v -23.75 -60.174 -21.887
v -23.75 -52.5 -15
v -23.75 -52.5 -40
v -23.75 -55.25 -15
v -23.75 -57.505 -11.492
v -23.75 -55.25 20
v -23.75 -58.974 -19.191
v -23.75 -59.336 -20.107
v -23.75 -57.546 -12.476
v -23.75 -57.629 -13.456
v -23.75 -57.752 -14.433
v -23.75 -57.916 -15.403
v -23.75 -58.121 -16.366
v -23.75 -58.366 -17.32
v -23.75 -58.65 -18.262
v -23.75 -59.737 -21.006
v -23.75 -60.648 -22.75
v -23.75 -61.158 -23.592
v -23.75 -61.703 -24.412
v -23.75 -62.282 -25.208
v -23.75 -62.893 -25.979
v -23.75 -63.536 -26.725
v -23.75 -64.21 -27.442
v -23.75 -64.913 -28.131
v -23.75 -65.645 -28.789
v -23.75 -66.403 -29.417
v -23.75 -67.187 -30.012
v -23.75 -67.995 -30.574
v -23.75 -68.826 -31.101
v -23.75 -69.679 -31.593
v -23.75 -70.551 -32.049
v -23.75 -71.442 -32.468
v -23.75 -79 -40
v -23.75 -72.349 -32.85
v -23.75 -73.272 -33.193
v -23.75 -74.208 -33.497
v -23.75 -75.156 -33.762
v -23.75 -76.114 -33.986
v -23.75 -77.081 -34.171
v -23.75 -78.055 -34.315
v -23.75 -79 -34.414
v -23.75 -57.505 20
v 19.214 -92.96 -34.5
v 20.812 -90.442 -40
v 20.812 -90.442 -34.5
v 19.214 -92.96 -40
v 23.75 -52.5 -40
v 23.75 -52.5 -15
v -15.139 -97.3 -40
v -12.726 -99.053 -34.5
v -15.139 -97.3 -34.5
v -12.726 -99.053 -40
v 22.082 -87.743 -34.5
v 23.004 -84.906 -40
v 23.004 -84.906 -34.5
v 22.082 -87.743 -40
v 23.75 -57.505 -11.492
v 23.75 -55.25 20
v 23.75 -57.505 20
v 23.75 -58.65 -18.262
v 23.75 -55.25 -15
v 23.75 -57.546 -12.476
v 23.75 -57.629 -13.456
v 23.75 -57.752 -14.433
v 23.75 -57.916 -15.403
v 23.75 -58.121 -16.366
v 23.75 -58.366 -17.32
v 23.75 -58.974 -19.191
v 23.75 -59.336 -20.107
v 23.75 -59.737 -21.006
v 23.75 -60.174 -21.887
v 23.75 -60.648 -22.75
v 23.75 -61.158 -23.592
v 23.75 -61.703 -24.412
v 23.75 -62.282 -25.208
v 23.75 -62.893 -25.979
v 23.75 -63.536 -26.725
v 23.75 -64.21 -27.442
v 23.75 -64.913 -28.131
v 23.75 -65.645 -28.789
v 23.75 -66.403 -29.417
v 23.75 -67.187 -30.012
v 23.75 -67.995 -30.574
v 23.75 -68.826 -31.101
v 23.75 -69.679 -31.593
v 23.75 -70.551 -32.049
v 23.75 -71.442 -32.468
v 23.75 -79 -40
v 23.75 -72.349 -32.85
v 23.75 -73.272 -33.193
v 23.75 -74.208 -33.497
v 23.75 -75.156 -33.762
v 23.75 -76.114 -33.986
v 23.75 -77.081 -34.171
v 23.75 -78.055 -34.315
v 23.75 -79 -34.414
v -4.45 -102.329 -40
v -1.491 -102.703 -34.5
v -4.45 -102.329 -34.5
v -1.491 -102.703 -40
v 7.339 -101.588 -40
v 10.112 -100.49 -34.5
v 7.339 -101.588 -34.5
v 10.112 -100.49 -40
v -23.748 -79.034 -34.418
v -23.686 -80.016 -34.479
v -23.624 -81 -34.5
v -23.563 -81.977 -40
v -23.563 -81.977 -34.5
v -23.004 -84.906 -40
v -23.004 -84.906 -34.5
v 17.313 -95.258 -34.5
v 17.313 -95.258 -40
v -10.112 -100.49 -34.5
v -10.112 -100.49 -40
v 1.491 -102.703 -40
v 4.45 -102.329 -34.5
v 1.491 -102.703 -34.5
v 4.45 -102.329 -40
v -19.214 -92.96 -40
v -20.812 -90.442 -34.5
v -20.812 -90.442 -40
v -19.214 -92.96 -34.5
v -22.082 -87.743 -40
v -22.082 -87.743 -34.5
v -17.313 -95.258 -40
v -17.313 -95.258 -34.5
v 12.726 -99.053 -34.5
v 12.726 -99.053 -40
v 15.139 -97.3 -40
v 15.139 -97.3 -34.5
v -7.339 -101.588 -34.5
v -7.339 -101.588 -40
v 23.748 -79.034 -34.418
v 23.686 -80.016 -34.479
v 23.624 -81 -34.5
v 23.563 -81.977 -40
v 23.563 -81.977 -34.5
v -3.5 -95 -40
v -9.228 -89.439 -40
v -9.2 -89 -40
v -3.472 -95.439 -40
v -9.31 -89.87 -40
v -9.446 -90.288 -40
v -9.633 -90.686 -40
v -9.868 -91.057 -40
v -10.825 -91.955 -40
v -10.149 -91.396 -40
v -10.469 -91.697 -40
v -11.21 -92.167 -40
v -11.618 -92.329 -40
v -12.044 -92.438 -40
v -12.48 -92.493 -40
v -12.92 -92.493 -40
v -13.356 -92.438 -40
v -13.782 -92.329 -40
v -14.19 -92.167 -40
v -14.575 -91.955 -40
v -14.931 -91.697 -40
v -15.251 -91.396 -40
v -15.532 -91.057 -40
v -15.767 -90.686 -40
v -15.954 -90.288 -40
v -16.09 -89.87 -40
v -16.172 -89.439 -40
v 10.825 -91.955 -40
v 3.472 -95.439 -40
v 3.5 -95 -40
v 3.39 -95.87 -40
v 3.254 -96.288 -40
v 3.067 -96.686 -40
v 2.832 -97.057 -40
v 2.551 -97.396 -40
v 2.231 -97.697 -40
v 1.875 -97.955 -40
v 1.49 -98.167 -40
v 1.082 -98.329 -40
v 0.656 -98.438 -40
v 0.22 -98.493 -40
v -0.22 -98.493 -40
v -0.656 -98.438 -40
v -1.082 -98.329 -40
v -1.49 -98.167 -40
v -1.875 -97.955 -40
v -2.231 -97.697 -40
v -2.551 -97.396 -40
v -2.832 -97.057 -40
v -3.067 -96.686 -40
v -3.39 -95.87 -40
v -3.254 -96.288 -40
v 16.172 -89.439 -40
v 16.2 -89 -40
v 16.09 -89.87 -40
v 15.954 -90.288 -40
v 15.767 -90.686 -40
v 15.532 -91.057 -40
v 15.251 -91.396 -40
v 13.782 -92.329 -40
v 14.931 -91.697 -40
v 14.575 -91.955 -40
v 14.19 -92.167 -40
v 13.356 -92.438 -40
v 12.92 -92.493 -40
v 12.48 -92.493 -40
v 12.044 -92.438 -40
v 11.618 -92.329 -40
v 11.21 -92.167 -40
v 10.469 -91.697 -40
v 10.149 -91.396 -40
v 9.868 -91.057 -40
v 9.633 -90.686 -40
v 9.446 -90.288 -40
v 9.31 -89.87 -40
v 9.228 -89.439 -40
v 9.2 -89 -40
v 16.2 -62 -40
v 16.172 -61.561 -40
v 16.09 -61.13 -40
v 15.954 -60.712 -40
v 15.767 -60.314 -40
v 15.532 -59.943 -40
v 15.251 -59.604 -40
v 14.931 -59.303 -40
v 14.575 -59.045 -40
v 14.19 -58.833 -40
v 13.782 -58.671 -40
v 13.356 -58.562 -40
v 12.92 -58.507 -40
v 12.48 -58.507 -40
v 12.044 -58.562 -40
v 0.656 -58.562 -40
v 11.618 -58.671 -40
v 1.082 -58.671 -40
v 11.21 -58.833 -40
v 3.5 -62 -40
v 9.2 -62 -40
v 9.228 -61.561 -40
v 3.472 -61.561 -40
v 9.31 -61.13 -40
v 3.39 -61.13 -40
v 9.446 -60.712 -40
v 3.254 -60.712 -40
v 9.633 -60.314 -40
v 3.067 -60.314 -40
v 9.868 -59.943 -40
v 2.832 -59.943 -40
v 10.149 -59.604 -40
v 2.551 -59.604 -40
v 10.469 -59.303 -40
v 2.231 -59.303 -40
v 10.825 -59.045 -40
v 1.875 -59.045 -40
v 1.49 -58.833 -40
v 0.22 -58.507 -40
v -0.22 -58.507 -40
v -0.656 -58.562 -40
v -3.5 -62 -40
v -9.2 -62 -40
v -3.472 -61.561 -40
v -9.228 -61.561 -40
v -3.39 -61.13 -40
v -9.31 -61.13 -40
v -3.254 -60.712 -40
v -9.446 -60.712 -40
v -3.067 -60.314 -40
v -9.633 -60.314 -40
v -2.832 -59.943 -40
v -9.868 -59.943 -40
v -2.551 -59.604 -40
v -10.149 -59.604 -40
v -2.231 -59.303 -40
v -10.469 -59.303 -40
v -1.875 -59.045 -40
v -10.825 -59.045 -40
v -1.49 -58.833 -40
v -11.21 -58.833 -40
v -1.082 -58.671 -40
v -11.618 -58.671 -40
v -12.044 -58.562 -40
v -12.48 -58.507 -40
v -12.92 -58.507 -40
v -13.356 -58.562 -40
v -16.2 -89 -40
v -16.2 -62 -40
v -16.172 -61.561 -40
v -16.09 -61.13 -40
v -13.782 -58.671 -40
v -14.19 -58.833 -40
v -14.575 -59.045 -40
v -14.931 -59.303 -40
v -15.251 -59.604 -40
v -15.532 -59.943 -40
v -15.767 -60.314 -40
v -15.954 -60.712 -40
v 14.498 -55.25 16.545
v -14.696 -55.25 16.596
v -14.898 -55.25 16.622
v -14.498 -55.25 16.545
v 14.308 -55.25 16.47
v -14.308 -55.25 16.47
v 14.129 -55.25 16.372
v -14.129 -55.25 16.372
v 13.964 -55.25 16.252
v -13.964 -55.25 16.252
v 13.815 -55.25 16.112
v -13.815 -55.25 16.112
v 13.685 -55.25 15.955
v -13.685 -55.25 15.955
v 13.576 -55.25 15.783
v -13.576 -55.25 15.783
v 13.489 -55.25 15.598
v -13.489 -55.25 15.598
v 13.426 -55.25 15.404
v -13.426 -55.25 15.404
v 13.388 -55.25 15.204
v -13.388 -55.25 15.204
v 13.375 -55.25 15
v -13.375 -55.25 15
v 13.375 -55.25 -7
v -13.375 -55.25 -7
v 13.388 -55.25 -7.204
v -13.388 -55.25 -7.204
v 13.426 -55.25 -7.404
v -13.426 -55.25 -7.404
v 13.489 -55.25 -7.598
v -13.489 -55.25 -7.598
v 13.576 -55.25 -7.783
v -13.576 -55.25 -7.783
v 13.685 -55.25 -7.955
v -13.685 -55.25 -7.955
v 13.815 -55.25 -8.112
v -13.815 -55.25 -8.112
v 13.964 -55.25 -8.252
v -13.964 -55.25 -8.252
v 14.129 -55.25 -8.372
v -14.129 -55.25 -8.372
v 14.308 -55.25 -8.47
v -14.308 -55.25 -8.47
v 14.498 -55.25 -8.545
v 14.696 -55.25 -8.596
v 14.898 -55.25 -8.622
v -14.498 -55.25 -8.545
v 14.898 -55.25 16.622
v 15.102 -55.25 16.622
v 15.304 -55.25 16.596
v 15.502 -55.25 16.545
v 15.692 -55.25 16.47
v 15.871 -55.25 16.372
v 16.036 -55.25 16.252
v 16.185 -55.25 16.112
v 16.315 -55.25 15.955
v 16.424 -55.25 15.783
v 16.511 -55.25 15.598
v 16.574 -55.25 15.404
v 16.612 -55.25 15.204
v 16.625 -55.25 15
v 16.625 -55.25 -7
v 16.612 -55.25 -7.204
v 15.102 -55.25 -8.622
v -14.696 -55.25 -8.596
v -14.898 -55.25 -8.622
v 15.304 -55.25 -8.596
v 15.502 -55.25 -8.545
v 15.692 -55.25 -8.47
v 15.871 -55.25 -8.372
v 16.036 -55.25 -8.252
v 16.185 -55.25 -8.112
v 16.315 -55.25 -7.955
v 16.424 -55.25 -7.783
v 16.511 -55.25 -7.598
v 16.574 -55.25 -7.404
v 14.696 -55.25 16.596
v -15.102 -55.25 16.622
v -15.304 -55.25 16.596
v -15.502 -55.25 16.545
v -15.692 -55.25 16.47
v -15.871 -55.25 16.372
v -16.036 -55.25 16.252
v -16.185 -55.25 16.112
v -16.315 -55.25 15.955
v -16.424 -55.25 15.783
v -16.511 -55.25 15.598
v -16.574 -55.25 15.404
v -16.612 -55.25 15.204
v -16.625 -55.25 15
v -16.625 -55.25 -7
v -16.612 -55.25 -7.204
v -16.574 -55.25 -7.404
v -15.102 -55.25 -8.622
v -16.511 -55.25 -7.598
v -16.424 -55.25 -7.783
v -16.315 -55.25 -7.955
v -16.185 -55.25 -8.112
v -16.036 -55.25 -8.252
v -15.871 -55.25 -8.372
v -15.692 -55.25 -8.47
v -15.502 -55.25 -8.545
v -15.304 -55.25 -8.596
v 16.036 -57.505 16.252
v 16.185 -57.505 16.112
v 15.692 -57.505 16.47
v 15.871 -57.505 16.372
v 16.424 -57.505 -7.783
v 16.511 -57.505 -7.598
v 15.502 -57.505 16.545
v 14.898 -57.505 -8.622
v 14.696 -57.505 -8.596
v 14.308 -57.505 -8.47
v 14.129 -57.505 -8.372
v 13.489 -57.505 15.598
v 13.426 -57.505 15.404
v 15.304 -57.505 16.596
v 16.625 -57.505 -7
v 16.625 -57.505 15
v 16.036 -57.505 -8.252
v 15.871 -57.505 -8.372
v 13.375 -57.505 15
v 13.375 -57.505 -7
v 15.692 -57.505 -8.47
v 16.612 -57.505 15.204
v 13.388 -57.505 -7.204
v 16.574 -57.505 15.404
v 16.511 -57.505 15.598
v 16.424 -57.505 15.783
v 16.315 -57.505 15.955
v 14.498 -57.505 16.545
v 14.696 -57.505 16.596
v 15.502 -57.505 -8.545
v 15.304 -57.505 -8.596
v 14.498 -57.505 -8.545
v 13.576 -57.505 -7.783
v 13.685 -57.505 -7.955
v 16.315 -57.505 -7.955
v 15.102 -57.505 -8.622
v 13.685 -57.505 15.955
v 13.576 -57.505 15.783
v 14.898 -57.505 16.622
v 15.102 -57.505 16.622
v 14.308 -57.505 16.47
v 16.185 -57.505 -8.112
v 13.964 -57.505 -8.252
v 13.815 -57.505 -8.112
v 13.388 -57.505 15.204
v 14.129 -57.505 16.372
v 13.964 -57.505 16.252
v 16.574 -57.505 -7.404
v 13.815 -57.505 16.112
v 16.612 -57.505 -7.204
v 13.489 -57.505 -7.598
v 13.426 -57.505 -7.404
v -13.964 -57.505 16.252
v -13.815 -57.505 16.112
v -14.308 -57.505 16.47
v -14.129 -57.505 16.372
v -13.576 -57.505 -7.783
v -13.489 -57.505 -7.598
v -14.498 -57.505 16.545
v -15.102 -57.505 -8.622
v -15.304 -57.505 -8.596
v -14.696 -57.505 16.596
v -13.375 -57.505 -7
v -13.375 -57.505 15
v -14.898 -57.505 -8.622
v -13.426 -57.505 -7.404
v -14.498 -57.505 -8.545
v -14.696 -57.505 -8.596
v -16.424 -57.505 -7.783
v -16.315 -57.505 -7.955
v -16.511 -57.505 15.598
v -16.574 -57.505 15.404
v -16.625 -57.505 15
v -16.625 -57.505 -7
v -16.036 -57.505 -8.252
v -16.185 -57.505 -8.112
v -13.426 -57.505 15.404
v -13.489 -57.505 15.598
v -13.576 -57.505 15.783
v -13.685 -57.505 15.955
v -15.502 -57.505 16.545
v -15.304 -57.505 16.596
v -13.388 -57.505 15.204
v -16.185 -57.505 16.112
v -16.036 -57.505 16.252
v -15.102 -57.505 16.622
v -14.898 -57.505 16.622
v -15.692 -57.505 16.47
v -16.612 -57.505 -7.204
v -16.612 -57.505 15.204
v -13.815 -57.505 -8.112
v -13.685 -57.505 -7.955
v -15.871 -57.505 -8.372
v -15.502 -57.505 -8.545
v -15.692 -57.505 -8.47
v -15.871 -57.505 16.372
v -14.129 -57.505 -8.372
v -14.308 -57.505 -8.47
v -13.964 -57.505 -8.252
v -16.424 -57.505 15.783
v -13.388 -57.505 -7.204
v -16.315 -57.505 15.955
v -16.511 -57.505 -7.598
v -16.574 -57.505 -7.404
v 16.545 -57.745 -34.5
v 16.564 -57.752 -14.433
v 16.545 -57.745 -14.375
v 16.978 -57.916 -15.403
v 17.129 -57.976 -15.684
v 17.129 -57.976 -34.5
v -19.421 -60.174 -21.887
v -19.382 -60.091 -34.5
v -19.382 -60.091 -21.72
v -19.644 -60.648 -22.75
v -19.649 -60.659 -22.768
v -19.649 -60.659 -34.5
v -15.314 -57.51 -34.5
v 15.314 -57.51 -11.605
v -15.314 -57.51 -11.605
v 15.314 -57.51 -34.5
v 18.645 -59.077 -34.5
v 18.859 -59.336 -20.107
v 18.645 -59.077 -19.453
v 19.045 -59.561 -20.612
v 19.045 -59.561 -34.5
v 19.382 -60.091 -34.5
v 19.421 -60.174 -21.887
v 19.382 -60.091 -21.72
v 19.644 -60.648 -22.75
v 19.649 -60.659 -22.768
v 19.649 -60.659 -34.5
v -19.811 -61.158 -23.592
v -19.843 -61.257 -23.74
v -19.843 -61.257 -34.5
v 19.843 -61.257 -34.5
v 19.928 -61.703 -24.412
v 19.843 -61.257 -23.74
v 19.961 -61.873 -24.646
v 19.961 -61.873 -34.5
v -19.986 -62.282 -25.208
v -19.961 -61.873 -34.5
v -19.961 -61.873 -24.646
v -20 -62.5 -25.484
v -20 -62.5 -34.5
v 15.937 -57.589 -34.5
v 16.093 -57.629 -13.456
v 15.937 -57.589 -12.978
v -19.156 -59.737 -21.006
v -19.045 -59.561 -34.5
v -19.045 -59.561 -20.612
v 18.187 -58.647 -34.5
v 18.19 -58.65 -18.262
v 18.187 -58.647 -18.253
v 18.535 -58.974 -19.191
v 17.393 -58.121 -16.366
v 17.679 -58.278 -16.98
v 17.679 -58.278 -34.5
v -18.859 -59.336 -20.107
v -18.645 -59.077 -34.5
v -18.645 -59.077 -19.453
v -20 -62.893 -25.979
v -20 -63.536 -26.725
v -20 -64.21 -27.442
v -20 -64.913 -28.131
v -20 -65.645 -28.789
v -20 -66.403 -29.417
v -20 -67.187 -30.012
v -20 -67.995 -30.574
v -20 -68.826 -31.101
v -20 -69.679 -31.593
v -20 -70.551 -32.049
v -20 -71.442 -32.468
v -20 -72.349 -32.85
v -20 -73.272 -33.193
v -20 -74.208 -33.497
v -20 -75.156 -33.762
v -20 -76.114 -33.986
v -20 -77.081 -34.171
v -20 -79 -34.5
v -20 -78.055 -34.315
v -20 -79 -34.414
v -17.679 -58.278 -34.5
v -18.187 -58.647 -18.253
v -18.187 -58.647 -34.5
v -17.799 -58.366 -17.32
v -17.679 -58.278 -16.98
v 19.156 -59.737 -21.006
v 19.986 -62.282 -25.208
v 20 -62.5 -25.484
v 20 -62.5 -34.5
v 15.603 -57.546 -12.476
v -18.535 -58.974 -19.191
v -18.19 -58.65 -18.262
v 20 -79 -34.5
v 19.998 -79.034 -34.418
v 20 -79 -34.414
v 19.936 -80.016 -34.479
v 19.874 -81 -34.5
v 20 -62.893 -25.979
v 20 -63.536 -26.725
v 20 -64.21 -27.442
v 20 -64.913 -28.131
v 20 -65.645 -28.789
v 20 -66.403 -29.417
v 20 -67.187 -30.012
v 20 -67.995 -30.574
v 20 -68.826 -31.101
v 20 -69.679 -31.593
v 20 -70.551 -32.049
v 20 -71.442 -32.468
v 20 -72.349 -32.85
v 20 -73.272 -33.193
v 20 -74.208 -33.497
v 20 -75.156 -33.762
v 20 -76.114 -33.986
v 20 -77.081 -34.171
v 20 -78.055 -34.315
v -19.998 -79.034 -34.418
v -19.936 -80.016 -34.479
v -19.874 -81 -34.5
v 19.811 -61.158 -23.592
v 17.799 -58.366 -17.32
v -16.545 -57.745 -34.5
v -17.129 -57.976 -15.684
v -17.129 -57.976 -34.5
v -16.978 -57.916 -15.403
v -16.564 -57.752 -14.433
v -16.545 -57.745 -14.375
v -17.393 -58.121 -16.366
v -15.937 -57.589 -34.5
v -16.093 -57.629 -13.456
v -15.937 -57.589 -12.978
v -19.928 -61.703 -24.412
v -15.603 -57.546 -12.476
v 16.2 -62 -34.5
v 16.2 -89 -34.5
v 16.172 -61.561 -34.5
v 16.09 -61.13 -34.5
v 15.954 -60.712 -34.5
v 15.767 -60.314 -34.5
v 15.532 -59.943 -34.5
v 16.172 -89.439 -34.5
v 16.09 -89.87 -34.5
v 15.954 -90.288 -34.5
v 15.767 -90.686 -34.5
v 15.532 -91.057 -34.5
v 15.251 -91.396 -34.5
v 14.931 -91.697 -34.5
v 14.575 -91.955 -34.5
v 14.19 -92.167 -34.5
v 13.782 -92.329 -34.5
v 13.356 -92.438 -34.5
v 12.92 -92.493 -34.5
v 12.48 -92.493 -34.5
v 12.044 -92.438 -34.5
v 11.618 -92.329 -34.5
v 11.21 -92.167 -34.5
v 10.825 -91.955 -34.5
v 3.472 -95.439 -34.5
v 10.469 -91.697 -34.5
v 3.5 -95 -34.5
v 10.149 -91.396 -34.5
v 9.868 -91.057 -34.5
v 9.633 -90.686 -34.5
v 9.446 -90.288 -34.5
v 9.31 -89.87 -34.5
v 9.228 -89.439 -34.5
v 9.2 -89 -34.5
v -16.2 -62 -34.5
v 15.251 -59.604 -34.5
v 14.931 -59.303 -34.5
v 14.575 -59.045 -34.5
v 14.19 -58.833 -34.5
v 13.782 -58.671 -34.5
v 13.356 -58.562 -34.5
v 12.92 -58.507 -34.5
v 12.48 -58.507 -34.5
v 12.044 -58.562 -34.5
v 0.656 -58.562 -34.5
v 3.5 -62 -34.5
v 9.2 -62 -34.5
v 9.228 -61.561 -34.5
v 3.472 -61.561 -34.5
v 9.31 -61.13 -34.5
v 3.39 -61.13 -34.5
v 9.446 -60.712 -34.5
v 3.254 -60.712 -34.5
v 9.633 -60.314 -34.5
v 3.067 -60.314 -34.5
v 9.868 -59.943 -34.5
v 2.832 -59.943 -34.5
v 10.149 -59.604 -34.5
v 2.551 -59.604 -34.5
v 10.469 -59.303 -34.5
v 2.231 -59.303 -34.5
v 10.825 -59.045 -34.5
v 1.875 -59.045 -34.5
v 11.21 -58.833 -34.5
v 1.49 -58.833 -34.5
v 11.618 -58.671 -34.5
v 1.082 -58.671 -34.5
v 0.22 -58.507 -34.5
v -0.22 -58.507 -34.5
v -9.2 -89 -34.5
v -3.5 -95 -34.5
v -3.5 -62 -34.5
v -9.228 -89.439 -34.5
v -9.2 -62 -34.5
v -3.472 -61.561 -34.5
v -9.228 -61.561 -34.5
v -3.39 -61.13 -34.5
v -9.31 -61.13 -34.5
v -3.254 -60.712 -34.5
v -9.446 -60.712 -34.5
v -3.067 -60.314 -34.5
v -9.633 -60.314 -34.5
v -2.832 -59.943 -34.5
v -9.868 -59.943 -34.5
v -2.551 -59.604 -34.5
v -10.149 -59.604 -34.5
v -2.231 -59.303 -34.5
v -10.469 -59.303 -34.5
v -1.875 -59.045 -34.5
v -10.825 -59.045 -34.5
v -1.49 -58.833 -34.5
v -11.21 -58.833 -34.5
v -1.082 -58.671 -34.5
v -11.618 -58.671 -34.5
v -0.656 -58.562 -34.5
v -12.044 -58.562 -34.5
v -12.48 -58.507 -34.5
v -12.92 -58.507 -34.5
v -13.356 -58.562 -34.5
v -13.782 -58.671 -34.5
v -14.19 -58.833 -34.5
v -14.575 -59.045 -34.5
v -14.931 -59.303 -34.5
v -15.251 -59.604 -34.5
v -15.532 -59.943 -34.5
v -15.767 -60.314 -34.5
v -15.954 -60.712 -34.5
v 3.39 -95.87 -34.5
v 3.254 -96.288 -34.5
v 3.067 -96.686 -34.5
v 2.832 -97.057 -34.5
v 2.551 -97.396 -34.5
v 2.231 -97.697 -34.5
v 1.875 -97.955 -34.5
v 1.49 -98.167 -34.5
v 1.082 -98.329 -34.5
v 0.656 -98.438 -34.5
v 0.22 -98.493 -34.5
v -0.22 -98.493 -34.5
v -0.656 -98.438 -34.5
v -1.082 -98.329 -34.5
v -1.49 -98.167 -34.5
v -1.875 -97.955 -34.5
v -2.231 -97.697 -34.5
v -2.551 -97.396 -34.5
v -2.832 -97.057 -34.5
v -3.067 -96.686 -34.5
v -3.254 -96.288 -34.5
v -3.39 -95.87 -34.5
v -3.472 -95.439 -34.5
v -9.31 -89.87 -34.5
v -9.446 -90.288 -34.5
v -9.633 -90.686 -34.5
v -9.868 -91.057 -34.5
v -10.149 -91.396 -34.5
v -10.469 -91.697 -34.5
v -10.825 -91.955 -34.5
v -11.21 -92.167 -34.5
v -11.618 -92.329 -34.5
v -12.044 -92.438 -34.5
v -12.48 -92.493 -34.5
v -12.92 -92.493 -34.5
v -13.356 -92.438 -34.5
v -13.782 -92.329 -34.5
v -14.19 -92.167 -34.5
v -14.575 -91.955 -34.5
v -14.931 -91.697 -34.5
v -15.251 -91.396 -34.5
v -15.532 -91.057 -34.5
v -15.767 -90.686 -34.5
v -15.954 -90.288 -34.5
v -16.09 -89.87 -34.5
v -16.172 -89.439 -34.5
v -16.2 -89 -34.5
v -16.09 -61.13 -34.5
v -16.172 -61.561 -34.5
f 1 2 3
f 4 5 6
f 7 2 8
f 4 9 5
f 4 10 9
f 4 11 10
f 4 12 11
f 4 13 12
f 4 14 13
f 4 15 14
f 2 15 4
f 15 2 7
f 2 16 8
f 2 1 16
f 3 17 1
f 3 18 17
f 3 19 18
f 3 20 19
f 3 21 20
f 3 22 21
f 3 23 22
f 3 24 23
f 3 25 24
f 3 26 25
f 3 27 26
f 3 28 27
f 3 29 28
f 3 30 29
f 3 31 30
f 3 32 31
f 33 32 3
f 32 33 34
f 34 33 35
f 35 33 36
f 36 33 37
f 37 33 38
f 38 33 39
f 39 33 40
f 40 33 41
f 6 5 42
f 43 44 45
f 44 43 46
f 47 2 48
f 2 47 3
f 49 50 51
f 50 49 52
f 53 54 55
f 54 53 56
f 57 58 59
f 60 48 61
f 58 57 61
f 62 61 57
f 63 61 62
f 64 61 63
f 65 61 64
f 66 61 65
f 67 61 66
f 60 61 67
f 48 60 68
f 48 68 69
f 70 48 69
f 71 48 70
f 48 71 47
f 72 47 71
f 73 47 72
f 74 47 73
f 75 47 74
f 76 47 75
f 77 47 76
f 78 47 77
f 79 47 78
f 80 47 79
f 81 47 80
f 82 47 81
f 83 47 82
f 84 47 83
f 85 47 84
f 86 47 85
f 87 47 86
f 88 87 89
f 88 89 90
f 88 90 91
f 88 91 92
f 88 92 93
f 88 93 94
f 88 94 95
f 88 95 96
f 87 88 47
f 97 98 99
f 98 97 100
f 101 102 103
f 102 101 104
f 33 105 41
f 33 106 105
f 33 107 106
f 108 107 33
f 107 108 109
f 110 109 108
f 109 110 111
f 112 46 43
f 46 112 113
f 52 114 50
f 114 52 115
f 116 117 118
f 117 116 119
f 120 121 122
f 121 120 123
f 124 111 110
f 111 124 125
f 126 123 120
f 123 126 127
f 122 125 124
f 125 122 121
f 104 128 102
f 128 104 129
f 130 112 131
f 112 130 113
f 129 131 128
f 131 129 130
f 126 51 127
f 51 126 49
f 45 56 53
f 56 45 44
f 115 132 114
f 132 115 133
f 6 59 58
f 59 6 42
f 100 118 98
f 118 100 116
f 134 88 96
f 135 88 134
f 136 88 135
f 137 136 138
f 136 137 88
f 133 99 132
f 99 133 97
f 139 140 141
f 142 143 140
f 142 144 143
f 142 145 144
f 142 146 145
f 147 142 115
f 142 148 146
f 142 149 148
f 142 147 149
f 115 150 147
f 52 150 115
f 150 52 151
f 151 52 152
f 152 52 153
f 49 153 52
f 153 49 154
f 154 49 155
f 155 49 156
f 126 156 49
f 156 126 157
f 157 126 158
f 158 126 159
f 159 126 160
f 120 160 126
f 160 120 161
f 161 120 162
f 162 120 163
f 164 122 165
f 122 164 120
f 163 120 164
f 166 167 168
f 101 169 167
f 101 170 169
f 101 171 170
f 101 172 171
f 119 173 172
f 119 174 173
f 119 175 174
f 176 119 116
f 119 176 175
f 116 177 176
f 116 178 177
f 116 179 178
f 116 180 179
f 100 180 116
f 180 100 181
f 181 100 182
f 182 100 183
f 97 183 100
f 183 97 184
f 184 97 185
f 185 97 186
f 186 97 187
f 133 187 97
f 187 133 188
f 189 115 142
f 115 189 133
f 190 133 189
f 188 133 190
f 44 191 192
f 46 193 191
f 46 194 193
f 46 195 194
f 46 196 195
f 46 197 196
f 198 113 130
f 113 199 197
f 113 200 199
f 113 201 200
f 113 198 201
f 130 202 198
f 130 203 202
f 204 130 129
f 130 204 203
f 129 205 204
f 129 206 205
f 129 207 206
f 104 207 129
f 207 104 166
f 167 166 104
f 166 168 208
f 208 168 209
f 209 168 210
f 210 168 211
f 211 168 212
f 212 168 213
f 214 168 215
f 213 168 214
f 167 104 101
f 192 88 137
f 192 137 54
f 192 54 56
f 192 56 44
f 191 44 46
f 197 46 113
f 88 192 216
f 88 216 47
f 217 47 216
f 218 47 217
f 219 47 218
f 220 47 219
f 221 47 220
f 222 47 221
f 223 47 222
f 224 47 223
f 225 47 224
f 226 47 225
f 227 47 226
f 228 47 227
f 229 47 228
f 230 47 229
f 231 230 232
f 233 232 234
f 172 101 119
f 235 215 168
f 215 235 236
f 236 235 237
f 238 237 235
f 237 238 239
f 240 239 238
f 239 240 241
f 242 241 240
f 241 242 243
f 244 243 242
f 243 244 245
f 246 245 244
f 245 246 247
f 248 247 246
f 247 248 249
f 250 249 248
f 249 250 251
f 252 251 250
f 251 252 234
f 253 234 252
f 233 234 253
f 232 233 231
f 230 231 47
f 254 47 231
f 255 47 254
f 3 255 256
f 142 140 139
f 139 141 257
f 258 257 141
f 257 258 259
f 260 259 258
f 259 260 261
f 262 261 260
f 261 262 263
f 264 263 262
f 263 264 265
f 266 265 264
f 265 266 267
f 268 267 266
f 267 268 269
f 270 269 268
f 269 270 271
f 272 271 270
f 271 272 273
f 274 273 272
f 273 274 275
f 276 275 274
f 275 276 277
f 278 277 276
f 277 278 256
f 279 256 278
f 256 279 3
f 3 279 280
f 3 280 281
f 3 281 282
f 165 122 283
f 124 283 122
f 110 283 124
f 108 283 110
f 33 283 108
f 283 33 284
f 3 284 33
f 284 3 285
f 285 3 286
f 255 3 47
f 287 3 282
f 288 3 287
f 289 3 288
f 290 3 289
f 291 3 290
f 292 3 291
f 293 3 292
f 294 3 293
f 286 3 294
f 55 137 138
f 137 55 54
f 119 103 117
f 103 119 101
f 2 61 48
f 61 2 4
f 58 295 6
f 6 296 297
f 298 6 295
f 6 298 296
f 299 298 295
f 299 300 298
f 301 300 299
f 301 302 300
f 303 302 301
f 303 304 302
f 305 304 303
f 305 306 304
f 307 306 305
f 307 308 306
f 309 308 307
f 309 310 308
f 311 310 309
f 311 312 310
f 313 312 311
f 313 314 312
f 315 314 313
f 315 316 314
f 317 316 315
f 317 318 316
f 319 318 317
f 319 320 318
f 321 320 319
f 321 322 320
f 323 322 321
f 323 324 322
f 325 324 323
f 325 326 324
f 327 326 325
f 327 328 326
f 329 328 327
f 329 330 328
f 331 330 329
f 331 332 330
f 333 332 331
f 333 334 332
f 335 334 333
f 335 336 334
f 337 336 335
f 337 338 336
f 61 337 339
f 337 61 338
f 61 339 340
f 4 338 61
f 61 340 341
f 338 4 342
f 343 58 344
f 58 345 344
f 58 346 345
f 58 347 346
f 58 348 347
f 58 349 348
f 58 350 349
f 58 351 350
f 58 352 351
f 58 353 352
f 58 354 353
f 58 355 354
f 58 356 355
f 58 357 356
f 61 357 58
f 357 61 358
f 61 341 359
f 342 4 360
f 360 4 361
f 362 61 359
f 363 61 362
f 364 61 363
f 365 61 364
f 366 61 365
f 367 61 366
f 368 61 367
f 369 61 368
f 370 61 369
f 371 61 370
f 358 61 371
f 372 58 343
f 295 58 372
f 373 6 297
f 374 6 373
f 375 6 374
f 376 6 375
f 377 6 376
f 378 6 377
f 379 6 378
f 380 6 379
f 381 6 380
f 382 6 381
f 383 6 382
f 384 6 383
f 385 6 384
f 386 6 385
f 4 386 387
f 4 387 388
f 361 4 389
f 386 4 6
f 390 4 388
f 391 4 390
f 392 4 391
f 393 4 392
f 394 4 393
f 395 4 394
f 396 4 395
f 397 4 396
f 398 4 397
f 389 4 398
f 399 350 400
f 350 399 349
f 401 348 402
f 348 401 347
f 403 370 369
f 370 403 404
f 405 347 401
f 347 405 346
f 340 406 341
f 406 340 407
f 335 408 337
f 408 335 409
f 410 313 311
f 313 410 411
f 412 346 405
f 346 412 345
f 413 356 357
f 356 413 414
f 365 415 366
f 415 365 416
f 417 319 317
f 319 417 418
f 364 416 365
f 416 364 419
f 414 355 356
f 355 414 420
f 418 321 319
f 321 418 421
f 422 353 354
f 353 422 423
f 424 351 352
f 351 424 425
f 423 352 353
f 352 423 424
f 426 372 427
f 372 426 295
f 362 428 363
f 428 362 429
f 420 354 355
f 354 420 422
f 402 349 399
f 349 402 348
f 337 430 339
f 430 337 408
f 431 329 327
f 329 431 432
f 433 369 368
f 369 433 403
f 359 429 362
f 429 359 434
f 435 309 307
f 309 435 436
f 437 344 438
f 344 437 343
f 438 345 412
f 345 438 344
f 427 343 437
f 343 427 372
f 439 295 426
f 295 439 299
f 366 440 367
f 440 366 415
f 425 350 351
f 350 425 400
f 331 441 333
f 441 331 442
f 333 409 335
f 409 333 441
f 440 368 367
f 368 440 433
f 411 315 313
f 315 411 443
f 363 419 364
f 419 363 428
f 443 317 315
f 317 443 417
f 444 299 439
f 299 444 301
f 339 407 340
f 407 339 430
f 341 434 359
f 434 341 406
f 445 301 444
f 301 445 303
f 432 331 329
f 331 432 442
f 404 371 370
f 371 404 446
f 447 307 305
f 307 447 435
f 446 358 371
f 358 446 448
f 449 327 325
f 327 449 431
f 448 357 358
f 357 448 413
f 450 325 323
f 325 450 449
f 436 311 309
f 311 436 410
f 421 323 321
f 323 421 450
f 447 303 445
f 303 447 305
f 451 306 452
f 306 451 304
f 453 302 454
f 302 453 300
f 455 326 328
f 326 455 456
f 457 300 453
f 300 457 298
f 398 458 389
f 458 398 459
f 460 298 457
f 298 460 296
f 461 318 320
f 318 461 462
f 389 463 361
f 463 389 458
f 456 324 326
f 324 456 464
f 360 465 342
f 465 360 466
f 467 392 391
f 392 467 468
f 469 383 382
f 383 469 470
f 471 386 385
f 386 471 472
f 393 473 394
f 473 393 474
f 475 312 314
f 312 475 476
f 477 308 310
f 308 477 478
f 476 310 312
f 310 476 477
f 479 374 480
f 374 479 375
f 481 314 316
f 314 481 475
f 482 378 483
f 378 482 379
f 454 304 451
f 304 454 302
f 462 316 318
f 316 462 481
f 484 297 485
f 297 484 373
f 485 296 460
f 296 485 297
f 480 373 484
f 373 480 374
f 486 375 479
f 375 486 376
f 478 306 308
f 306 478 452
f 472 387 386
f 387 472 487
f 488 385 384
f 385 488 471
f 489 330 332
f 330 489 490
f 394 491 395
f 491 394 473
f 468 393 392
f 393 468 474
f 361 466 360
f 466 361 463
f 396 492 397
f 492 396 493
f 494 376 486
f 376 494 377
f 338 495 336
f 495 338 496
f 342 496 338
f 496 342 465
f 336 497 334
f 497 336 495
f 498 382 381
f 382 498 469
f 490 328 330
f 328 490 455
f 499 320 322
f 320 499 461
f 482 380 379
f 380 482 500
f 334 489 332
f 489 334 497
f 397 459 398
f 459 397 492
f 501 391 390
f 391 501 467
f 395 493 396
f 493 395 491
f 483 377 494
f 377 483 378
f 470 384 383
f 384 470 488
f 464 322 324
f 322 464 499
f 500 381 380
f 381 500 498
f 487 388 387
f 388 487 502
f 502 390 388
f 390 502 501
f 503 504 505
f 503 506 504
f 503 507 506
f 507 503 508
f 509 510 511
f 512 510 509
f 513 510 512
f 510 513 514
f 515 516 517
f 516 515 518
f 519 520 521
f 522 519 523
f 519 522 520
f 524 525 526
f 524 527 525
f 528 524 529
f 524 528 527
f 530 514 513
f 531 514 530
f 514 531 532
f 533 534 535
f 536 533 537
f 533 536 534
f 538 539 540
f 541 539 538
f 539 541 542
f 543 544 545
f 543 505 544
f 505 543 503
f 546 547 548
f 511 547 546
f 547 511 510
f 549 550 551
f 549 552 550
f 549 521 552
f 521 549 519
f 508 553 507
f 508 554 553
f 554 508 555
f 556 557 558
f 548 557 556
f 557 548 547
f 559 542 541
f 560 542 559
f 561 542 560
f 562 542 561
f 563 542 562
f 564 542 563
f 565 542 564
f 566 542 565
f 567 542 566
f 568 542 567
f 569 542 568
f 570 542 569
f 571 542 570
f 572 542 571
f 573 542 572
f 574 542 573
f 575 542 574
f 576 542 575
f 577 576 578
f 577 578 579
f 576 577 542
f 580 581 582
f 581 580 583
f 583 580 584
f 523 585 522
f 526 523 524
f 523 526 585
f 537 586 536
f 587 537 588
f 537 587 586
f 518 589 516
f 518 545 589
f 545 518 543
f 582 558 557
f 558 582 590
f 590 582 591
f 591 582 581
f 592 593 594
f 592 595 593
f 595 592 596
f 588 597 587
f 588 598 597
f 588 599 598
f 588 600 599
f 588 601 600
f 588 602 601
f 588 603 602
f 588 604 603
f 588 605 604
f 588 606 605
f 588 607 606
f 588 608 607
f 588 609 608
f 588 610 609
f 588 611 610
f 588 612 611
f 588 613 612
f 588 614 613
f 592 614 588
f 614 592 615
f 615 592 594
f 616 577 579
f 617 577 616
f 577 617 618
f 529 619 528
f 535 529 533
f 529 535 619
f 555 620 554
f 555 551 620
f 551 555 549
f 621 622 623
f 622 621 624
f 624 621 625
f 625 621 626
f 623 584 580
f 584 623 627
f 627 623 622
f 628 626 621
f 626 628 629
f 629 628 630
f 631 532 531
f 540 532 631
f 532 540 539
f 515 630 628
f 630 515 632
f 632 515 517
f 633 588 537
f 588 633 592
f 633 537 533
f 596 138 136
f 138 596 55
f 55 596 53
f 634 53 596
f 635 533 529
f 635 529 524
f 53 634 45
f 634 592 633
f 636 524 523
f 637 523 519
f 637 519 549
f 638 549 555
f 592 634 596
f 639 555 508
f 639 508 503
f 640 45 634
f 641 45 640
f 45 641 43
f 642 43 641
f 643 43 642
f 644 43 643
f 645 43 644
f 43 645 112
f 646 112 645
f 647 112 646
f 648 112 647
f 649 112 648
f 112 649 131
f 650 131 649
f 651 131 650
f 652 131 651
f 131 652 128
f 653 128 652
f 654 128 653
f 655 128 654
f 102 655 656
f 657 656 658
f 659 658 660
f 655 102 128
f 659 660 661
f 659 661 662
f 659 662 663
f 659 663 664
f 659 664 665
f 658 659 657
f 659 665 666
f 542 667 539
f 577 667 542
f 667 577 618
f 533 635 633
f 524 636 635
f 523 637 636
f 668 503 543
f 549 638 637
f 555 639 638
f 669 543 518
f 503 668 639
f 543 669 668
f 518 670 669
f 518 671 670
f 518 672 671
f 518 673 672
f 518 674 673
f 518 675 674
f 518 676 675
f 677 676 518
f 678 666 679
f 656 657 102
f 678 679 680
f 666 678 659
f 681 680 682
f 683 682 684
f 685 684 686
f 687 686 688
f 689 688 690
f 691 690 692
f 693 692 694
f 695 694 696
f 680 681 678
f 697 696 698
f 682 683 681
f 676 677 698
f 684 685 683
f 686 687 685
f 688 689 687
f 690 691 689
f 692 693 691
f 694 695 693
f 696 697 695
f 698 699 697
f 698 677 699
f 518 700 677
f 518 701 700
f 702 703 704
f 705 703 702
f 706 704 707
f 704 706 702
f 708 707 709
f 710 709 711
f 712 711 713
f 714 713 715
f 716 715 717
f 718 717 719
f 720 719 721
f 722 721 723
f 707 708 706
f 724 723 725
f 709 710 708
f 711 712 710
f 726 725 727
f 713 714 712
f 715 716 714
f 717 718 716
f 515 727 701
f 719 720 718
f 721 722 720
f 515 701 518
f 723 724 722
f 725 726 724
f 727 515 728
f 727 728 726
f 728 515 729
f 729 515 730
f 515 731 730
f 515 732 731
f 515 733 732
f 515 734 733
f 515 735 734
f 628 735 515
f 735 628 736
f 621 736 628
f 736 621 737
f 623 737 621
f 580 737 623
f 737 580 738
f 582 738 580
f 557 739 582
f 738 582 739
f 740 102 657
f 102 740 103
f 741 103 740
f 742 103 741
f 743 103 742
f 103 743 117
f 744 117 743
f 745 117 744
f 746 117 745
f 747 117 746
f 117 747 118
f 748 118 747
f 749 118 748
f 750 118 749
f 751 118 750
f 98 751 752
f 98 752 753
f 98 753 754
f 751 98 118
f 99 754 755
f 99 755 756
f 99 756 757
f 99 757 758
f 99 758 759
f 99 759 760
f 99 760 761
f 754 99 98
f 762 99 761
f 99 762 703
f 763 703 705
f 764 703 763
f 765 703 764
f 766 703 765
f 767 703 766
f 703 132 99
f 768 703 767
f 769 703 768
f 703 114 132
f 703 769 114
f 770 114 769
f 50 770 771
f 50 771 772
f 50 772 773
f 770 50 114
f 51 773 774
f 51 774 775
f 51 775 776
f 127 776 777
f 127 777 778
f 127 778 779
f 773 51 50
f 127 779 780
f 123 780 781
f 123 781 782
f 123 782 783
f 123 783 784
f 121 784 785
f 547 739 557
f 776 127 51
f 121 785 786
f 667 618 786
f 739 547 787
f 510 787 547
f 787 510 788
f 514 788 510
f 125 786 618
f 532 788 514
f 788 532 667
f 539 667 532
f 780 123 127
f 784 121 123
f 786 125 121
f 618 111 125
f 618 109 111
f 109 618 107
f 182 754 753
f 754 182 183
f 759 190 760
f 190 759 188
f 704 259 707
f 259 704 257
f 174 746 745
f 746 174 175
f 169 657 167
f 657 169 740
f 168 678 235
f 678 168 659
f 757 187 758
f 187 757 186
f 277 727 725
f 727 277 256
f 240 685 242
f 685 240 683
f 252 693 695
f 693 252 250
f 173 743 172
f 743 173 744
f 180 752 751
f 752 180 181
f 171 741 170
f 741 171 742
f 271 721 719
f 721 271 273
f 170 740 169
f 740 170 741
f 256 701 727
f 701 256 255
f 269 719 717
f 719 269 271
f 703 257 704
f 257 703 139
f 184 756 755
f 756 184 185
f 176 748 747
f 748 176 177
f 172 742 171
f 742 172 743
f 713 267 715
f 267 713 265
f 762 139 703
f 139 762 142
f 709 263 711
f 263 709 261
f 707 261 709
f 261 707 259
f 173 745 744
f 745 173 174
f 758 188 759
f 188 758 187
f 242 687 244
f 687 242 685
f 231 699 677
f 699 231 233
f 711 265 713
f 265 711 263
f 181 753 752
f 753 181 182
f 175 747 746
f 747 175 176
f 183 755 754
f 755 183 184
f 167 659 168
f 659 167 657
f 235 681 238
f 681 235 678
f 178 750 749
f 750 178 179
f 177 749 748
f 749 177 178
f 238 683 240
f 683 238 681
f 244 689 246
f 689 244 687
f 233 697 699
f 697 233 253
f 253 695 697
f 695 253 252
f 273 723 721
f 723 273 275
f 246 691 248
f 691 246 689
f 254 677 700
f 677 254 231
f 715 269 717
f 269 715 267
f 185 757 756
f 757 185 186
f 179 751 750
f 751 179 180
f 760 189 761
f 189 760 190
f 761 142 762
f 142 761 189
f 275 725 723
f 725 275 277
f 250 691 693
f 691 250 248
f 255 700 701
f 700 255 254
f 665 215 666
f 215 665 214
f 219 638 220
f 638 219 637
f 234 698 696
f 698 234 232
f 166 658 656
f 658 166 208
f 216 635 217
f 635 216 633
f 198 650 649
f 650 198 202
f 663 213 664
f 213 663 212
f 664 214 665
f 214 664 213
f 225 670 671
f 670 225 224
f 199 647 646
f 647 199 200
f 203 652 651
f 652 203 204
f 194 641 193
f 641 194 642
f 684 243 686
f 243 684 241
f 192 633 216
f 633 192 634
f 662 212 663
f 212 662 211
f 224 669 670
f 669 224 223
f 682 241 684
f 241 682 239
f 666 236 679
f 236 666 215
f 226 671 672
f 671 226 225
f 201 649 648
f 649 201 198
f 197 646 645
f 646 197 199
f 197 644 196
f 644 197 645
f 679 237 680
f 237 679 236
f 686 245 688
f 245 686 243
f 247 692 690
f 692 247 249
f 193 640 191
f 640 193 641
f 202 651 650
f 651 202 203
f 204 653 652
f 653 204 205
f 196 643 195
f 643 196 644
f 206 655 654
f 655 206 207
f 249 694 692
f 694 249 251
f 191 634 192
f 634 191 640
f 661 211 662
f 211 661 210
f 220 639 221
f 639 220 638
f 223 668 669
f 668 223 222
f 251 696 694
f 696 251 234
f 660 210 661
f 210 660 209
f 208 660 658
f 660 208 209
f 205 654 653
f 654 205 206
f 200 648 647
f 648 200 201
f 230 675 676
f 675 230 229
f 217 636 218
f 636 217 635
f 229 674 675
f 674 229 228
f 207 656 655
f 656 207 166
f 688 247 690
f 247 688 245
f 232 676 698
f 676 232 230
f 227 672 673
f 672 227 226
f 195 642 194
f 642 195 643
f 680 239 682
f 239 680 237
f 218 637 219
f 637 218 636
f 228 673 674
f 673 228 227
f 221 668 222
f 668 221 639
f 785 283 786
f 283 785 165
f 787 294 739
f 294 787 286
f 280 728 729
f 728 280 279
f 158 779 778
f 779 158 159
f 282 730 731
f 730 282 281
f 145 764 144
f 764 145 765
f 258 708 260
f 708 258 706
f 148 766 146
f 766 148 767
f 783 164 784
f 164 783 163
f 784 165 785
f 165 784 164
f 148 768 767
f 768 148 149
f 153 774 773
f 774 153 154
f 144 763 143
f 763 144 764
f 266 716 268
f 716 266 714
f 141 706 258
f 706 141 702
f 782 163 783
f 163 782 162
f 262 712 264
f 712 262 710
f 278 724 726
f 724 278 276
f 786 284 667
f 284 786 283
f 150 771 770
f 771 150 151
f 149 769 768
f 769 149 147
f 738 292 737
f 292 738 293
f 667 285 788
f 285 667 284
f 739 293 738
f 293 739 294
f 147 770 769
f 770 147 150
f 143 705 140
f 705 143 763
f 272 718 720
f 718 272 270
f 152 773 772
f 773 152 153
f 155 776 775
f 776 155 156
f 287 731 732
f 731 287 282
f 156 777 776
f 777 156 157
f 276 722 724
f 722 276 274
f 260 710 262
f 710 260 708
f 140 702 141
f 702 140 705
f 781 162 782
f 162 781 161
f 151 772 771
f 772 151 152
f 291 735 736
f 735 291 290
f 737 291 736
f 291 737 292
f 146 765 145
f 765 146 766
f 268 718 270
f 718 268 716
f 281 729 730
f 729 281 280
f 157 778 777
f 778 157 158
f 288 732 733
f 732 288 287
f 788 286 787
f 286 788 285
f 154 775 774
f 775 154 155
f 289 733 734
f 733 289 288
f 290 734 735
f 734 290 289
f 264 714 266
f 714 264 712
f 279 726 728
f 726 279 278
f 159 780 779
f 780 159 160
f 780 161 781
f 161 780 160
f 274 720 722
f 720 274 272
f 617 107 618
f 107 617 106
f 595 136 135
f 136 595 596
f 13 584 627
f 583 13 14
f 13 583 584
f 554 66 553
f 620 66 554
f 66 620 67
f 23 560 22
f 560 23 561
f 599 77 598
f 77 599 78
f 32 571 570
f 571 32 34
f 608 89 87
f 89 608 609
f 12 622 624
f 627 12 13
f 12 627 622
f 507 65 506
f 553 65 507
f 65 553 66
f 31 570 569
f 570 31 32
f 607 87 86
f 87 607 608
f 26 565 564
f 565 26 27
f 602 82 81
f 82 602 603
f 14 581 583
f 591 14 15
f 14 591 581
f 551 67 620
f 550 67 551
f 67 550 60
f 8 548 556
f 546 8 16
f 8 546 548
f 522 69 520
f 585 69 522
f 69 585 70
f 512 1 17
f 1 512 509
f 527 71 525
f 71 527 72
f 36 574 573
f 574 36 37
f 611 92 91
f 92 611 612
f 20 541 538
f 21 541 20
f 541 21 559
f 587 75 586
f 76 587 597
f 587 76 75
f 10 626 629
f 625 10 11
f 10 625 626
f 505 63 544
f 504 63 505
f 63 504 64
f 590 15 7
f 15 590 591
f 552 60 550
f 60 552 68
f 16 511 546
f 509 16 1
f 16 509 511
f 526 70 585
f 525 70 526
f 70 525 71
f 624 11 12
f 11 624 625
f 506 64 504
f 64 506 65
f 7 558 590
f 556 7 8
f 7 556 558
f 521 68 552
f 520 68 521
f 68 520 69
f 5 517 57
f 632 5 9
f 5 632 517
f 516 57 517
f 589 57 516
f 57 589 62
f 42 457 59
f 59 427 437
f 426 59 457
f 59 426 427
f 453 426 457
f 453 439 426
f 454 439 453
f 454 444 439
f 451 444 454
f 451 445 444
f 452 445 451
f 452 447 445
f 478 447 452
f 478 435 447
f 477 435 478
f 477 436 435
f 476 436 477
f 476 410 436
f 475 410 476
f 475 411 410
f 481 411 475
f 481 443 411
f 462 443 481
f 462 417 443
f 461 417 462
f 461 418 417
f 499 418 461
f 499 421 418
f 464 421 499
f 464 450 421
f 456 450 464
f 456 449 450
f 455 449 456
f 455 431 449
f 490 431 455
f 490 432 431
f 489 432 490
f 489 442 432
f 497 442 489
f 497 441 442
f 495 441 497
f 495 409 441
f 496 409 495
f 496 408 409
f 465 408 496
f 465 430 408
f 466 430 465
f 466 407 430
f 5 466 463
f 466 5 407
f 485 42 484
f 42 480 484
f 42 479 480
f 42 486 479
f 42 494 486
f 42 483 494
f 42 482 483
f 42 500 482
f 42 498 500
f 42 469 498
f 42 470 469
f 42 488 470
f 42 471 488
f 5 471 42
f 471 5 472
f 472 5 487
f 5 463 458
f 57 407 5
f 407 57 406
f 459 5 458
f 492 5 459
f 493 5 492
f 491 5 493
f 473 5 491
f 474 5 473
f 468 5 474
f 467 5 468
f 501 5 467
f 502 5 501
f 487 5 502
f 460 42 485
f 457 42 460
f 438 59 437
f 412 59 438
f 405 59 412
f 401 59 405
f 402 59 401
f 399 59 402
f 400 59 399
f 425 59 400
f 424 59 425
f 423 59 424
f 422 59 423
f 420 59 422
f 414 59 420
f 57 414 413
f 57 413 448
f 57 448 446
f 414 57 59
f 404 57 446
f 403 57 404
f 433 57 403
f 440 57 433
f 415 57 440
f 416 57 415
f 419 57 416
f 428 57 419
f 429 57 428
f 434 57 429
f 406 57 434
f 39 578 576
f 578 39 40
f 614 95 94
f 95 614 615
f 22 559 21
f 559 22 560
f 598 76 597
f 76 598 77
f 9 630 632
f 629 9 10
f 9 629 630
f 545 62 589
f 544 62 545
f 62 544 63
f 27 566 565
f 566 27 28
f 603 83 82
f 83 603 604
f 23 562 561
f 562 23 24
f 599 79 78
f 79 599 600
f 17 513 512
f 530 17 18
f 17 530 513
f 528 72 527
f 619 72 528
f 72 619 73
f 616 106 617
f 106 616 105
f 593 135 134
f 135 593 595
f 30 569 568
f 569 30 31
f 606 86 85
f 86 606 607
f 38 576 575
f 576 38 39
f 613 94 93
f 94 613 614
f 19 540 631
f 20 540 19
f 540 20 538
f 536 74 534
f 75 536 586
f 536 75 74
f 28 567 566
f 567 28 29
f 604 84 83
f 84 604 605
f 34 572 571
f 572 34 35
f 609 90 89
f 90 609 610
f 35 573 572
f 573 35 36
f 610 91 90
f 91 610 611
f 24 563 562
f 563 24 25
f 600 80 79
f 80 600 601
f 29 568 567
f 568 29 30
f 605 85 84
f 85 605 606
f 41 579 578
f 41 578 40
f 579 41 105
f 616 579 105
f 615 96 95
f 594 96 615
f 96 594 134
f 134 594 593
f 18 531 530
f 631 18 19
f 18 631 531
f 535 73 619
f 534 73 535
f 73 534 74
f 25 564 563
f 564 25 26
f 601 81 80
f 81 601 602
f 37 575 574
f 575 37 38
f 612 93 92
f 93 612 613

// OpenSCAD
// color([0.92,0.85,0.85]) translate([50,-6.55,10+4.9]) ti_lcr4500(throw_lens=false);



//translate([0,25.4/2*1,0]) mount_plate();
translate([0,-55,0]) mounting_bracket();
//translate([0,80,0]) rotate([0,0,180]) mounting_bracket();
//translate([40,-3*25.4+16.5,-4.95]) mount_bracket();
//translate([0, 4*25.4-16.5,-4.95]) scale([1,-1,1]) mount_bracket();

//translate([0,0,-50*1]) imperial_breadboard(width=10, length=14);
//hex_cutout();

//mount_end_cutout();
//leg_cutout();


//-----------------modules------------------------------------------------------



module hex_cutout() {
    intersection() {
        translate([15,-61.5,0]) cube([15,20,50],center=true);
        mount_plate();
    }
}


module leg_cutout() {
    intersection() {
        translate([0,0,20]) cube([50,20,20],center=true);
        mounting_bracket();
    }
}


module imperial_breadboard(width=10,length=15) {
    
    color("gray") difference() {
        translate([0,0,-1]) cube([25.4*width,25.4*length,2],center=true);
        
        for(xx = [-width/2.0:1:width/2.0]) {
            for(yy = [-(length/2.0):1:(length/2.0)]) {
                translate([25.4*xx,25.4*yy,0]) cylinder(h=100,d=25.4/4, $fn=10,center=true);
            }
        }
    }
      
}


module mount_plate() {
    difference() {
        union() {
            difference() {
                translate([0,0,-1.5+7]) cube([55,153.5-17,19],center=true);

                //Main LCR cutout
                translate([  0,0,9]) cube([100,122.5+7,20],center=true);
            }
            
            translate([  15, 129.5/2,0]) rotate([0,0,180]) {   
                translate([0, -0.5,0]) scale([1,2.5,1]) hull() {
                    translate([0,0,7]) rotate([-90,0,0]) cylinder(h=1,d=11,$fn=50);
                    translate([-11/2,0,-1]) cube([11,1,2]);
                }
            }
            
            translate([ -15, 129.5/2,0]) rotate([0,0,180]) {   
                translate([0, -0.5,0]) scale([1,2.5,1]) hull() {
                    translate([0,0,7]) rotate([-90,0,0]) cylinder(h=1,d=11,$fn=50);
                    translate([-11/2,0,-1]) cube([11,1,2]);
                }
            }
            
            translate([  15, -129.5/2,0]) rotate([0,0,0]) {   
                translate([0, -0.5,0]) scale([1,2.5,1]) hull() {
                    translate([0,0,7]) rotate([-90,0,0]) cylinder(h=1,d=11,$fn=50);
                    translate([-11/2,0,-1]) cube([11,1,2]);
                }
            }
            
            translate([ -15, -129.5/2,0]) rotate([0,0,0]) {   
                translate([0, -0.5,0]) scale([1,2.5,1]) hull() {
                    translate([0,0,7]) rotate([-90,0,0]) cylinder(h=1,d=11,$fn=50);
                    translate([-11/2,0,-1]) cube([11,1,2]);
                }
            }
            
            
        }
        
        translate([16,-121.5/2+2.5,0]) {
            cylinder(h=20,d=3.5,$fn=50,center=true);
            translate([-6.5,94,0]) cylinder(h=20,d=3.5,$fn=50,center=true);
            translate([-29.5,94,0]) cylinder(h=20,d=3.5,$fn=50,center=true);
        }
        
        
        //Side cutouts for brackets
        translate([  0, 77,0]) cube([48,20,50],center=true);
        translate([  0,-77,0]) cube([48,20,50],center=true);


        //Hex nut slots    
        translate([ 15,57.75+4,7]) rotate([90,30,0]) cylinder(h=8,d=6.5,$fn=6,center=true);
        translate([-15,57.75+4,7]) rotate([90,30,0]) cylinder(h=8,d=6.5,$fn=6,center=true);
        
        translate([ 15,-(57.75+4),7]) rotate([90,30,0]) cylinder(h=8,d=6.5,$fn=6,center=true);
        translate([-15,-(57.75+4),7]) rotate([90,30,0]) cylinder(h=8,d=6.5,$fn=6,center=true);
        
        //Screw through-holes
        translate([ 15,57.75+4,7]) rotate([90,30,0]) cylinder(h=20,d=3.25,$fn=50,center=true);
        translate([-15,57.75+4,7]) rotate([90,30,0]) cylinder(h=20,d=3.25,$fn=50,center=true);
        
        translate([ 15,-(57.75+4),7]) rotate([90,30,0]) cylinder(h=20,d=3.25,$fn=50,center=true);
        translate([-15,-(57.75+4),7]) rotate([90,30,0]) cylinder(h=20,d=3.25,$fn=50,center=true);

    }
}



module mount_bracket() {
    difference() {
        union() {
            hull() {
                translate([ 0,-20,-5]) cylinder(h=40,d=20,$fn=50,center=true);
                translate([-1, -9,-5]) cylinder(h=40,d=18,$fn=50,center=true);
            }
            hull() {
                translate([-1, -9,-5]) cylinder(h=40,d=18,$fn=50,center=true);
                translate([-5, 14,-5]) cylinder(h=40,d=10,$fn=50,center=true);
            }
            hull() {
                translate([-5, 14,-5]) cylinder(h=40,d=10,$fn=50,center=true);
                translate([-5, 25,-5]) cylinder(h=40,d=10,$fn=50,center=true);
            }
        }
        
//        translate([-0.15,-5,2.675]) cube([15,25,4],center=true);
        translate([-0.15-1,-5,2.675]) rotate([90,0,0]) hull() {
            translate([ 4,0,0]) cylinder(h=25,d=4,$fn=50,center=true);
            translate([-4,0,0]) cylinder(h=25,d=4,$fn=50,center=true);
        }
        
        
        translate([0,-17.5,18+5]) cube([30,25,50],center=true);
        translate([0,-30,-7.5+5]) scale([1,1,0.8]) rotate([0,90,0]) cylinder(h=40,d=50,$fn=100,center=true);
        
        translate([0,0,6]) {
            translate([0,12.5,-25]) cube([30,25,50],center=true);
            translate([0,20.5,-15-5.625]) cube([30,25,50],center=true);
            translate([0,8,0]) scale([1,1,0.55]) rotate([0,90,0]) cylinder(h=40,d=16,$fn=50,center=true);
        }
        
        translate([-4,7.75-1.5,0]) cylinder(h=40,d=5,$fn=50,center=true);
        translate([-4,7.75-1.5,17]) cylinder(h=10,d=7.5,$fn=50,center=true);
        
        hull() {
            translate([0,-12,-7.5]) cylinder(h=30,d=10,$fn=50,center=true);
            translate([0,-21,-7.5]) cylinder(h=30,d=10,$fn=50,center=true);
        }
        
        translate([0,-12,-18]) hull() {
            cylinder(h=30,d=1.25*25.4/4 - 0.75,$fn=50,center=true);
            translate([0,-9,0]) cylinder(h=30,d=1.25*25.4/4 - 0.75,$fn=50,center=true);
        }

    }
}




module mounting_bracket() {
    difference() {
        hull() {
            translate([0,0,-10]) cube([47.5,5,60],center=true);
            translate([0,-24,-10]) cylinder(h=60,d=47.5,center=true,$fn=50);
        }
        
        translate([0,2.25,5]) cube([55,5,40],center=true);
        
        translate([ 15,2,4]) hull() {
            translate([0,0,-11]) rotate([90,0,0]) cylinder(h=15,d=3.25,$fn=50);
            translate([0,0, 11]) rotate([90,0,0]) cylinder(h=15,d=3.25,$fn=50);
        }
        
        translate([-15,2,4]) hull() {
            translate([0,0,-11]) rotate([90,0,0]) cylinder(h=10,d=3.25,$fn=50);
            translate([0,0, 11]) rotate([90,0,0]) cylinder(h=10,d=3.25,$fn=50);
        }
        
        translate([0,-25,-34.5]) hull() {
            translate([ 15, 17.5,0]) rotate([0,0,0]) cylinder(h=24,d=10,$fn=50);
            translate([-15, 17.5,0]) rotate([0,0,0]) cylinder(h=24,d=10,$fn=50);
            translate([ 0,1,0]) rotate([0,0,0]) cylinder(h=24,d=40,$fn=50);
            
        }
        
        translate([0,-25,-45]) hull() {
            translate([0, 18,0]) rotate([0,0,0]) cylinder(h=20,d=7,$fn=50);
            translate([0,-15,0]) rotate([0,0,0]) cylinder(h=20,d=7,$fn=50);
        }
        
        translate([12.7,-25,-45]) hull() {
            translate([0, 18,0]) rotate([0,0,0]) cylinder(h=20,d=7,$fn=50);
            translate([0,-9,0]) rotate([0,0,0]) cylinder(h=20,d=7,$fn=50);
        }
        
        translate([-12.7,-25,-45]) hull() {
            translate([0, 18,0]) rotate([0,0,0]) cylinder(h=20,d=7,$fn=50);
            translate([0,-9,0]) rotate([0,0,0]) cylinder(h=20,d=7,$fn=50);
        }
        
        hull() {
            translate([0,-26,-11]) rotate([0,90,0]) cylinder(h=60,d=47,$fn=150,center=true);
            translate([0,-26,50]) rotate([0,90,0]) cylinder(h=60,d=47,$fn=150,center=true);
            translate([0,-56,-11]) rotate([0,90,0]) cylinder(h=60,d=47,$fn=150,center=true);
        }
    }
}




module ti_lcr4500(throw_lens=true) {
    
    translate([-67,20,-5-23.5/2+2]) {
        color("gold") {
            translate([-34,-59,2]) cylinder(h=36,d=6,$fn=6);
            translate([-34, 18,2]) cylinder(h=36,d=6,$fn=6);
            
            translate([34,-59,2]) cylinder(h=36,d=6,$fn=6);
            translate([34, 34,2]) cylinder(h=36,d=6,$fn=6);
        }
        
        
        color("green") translate([0,-1,35]) cube([77,122,2],center=true);
        
        color([0.2,0.2,0.2]) {
            translate([0,10,12]) cube([77,90,24],center=true);
            translate([14,12.5+15-1.5,12]) cube([105,70,24],center=true);
            translate([14,-1.75,2.5]) cube([105,121.5,5],center=true);
        }

        if(throw_lens) {
            color([0.2,0.2,0.2]) {
                translate([20,-20,23.5/2+5]) rotate([0,90,0]) cylinder(h=50,d=23.5,$fn=50);
            }
            color([1,1,1]) {
                translate([20.25,-20,23.5/2+5]) rotate([0,90,0]) cylinder(h=50,d=20,$fn=50);
            }
        } else {
            color([1,1,1]) {
                
                translate([18+20.25,-20,23.5/2+5-2]) cube([2,4/3*12,12],center=true);
            }
        }
    }
}
